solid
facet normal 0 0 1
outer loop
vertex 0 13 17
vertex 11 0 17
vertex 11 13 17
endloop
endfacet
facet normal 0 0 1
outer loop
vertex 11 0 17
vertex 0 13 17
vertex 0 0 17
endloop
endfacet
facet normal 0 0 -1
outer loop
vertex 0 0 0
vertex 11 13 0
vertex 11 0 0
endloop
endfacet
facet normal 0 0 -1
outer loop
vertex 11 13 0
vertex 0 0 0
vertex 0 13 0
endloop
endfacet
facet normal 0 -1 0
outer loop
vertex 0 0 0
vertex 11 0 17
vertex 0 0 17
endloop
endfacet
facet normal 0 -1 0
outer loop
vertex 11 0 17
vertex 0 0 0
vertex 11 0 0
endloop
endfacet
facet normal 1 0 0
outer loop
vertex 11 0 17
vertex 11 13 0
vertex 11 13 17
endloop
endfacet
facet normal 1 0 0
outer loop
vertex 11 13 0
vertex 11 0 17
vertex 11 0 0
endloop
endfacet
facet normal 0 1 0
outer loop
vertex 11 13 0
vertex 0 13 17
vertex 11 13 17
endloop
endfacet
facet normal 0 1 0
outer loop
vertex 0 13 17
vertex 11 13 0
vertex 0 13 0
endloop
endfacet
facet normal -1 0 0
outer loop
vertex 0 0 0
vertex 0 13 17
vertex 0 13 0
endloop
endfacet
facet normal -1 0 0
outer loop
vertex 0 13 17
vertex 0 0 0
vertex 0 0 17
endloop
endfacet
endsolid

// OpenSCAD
// Generated by SolidPython 1.0.1 on 2020-07-29 00:46:55


cube(size = [11, 13, 17]);
/***********************************************
*********      SolidPython code:      **********
************************************************
 
# import packages: SolidPython
from solid import *
from solid.utils import *
from itertools import chain, combinations, permutations


class Resize:

    def __init__(self, scad_file):
        self.scad_file = scad_file
        #self.scad_file = import_scad(scad_file)
        # cone/cylinder param:
        self.r1 = 0
        self.r2 = 0
        self.h = 0
        # rectangular prism param:
        self.w = 0
        self.l = 0
        # ellipse param:
        self.r = 0

    # import OpenScad code (file name corresponds to shape)


    # classify shape + parameters
    def assign(self, param1, param2, param3):
        if self.scad_file == 'cone.scad':
            self.r1 = param1
            self.r2 = param2
            self.h = param3
        elif self.scad_file == 'cylinder.scad':
            self.r1 = param1
            self.r2 = param2
            self.h = param3
        elif self.scad_file == 'rectangularPrism.scad':
            self.h = param1
            self.l = param2
            self.w = param3
        else:
            self.r = param1
            self.h = param2

    # resize parameters
    def iterate(self):
        x = range(3, 20, 2)
        i = 1
        if self.scad_file == 'cone.scad':
            tempList = list(permutations(x, 2))
            for temp in tempList:
                param1 = temp[0]
                param2 = temp[1]
                filepath = 'produced_scad_files/' + 'cone' + str(param1) + '_' + str(param2) + '_' + '.scad'
                scad_render_to_file(cylinder(h=param1, r1=param2, r2=0), filepath)

        elif self.scad_file == 'cylinder.scad':
            tempList = list(permutations(x, 3))
            for temp in tempList:
                param1 = temp[0]
                param2 = temp[1]
                filepath = 'produced_scad_files/' + 'cylinder' + str(param1) + '_' + str(param2) + '_' + '.scad'
                scad_render_to_file(cylinder(h=param1, r1=param2, r2=param2), filepath)

        elif self.scad_file == 'rectangularPrism.scad':
            tempList = list(permutations(x, 3))
            for temp in tempList:
                param1 = temp[0]
                param2 = temp[1]
                param3 = temp[2]
                filepath = 'produced_scad_files/' + 'rectangularPrism' + str(param1) + '_' + str(param2) + '_' + str(
                    param3) + '.scad'
                scad_render_to_file(cube(size=(param1, param2, param3)), filepath)

        elif self.scad_file == 'ellipse.scad':
            tempList = list(permutations(x, 4))
            for temp in tempList:
                param1 = temp[0]
                param2 = temp[1]
                param3 = temp[2]
                param4 = temp[3]
                filepath = 'produced_scad_files/' + 'ellipse' + str(param1) + '_' + str(param2) + '_' + str(param3) + '_' + str(param4) + '.scad'
                scad_render_to_file(scale([param1, param2, param3])(sphere(r=param4)), filepath)

    def render_to_scadfile(self):
        scad_render_to_file(scad, 'example.scad') 
 
************************************************/
